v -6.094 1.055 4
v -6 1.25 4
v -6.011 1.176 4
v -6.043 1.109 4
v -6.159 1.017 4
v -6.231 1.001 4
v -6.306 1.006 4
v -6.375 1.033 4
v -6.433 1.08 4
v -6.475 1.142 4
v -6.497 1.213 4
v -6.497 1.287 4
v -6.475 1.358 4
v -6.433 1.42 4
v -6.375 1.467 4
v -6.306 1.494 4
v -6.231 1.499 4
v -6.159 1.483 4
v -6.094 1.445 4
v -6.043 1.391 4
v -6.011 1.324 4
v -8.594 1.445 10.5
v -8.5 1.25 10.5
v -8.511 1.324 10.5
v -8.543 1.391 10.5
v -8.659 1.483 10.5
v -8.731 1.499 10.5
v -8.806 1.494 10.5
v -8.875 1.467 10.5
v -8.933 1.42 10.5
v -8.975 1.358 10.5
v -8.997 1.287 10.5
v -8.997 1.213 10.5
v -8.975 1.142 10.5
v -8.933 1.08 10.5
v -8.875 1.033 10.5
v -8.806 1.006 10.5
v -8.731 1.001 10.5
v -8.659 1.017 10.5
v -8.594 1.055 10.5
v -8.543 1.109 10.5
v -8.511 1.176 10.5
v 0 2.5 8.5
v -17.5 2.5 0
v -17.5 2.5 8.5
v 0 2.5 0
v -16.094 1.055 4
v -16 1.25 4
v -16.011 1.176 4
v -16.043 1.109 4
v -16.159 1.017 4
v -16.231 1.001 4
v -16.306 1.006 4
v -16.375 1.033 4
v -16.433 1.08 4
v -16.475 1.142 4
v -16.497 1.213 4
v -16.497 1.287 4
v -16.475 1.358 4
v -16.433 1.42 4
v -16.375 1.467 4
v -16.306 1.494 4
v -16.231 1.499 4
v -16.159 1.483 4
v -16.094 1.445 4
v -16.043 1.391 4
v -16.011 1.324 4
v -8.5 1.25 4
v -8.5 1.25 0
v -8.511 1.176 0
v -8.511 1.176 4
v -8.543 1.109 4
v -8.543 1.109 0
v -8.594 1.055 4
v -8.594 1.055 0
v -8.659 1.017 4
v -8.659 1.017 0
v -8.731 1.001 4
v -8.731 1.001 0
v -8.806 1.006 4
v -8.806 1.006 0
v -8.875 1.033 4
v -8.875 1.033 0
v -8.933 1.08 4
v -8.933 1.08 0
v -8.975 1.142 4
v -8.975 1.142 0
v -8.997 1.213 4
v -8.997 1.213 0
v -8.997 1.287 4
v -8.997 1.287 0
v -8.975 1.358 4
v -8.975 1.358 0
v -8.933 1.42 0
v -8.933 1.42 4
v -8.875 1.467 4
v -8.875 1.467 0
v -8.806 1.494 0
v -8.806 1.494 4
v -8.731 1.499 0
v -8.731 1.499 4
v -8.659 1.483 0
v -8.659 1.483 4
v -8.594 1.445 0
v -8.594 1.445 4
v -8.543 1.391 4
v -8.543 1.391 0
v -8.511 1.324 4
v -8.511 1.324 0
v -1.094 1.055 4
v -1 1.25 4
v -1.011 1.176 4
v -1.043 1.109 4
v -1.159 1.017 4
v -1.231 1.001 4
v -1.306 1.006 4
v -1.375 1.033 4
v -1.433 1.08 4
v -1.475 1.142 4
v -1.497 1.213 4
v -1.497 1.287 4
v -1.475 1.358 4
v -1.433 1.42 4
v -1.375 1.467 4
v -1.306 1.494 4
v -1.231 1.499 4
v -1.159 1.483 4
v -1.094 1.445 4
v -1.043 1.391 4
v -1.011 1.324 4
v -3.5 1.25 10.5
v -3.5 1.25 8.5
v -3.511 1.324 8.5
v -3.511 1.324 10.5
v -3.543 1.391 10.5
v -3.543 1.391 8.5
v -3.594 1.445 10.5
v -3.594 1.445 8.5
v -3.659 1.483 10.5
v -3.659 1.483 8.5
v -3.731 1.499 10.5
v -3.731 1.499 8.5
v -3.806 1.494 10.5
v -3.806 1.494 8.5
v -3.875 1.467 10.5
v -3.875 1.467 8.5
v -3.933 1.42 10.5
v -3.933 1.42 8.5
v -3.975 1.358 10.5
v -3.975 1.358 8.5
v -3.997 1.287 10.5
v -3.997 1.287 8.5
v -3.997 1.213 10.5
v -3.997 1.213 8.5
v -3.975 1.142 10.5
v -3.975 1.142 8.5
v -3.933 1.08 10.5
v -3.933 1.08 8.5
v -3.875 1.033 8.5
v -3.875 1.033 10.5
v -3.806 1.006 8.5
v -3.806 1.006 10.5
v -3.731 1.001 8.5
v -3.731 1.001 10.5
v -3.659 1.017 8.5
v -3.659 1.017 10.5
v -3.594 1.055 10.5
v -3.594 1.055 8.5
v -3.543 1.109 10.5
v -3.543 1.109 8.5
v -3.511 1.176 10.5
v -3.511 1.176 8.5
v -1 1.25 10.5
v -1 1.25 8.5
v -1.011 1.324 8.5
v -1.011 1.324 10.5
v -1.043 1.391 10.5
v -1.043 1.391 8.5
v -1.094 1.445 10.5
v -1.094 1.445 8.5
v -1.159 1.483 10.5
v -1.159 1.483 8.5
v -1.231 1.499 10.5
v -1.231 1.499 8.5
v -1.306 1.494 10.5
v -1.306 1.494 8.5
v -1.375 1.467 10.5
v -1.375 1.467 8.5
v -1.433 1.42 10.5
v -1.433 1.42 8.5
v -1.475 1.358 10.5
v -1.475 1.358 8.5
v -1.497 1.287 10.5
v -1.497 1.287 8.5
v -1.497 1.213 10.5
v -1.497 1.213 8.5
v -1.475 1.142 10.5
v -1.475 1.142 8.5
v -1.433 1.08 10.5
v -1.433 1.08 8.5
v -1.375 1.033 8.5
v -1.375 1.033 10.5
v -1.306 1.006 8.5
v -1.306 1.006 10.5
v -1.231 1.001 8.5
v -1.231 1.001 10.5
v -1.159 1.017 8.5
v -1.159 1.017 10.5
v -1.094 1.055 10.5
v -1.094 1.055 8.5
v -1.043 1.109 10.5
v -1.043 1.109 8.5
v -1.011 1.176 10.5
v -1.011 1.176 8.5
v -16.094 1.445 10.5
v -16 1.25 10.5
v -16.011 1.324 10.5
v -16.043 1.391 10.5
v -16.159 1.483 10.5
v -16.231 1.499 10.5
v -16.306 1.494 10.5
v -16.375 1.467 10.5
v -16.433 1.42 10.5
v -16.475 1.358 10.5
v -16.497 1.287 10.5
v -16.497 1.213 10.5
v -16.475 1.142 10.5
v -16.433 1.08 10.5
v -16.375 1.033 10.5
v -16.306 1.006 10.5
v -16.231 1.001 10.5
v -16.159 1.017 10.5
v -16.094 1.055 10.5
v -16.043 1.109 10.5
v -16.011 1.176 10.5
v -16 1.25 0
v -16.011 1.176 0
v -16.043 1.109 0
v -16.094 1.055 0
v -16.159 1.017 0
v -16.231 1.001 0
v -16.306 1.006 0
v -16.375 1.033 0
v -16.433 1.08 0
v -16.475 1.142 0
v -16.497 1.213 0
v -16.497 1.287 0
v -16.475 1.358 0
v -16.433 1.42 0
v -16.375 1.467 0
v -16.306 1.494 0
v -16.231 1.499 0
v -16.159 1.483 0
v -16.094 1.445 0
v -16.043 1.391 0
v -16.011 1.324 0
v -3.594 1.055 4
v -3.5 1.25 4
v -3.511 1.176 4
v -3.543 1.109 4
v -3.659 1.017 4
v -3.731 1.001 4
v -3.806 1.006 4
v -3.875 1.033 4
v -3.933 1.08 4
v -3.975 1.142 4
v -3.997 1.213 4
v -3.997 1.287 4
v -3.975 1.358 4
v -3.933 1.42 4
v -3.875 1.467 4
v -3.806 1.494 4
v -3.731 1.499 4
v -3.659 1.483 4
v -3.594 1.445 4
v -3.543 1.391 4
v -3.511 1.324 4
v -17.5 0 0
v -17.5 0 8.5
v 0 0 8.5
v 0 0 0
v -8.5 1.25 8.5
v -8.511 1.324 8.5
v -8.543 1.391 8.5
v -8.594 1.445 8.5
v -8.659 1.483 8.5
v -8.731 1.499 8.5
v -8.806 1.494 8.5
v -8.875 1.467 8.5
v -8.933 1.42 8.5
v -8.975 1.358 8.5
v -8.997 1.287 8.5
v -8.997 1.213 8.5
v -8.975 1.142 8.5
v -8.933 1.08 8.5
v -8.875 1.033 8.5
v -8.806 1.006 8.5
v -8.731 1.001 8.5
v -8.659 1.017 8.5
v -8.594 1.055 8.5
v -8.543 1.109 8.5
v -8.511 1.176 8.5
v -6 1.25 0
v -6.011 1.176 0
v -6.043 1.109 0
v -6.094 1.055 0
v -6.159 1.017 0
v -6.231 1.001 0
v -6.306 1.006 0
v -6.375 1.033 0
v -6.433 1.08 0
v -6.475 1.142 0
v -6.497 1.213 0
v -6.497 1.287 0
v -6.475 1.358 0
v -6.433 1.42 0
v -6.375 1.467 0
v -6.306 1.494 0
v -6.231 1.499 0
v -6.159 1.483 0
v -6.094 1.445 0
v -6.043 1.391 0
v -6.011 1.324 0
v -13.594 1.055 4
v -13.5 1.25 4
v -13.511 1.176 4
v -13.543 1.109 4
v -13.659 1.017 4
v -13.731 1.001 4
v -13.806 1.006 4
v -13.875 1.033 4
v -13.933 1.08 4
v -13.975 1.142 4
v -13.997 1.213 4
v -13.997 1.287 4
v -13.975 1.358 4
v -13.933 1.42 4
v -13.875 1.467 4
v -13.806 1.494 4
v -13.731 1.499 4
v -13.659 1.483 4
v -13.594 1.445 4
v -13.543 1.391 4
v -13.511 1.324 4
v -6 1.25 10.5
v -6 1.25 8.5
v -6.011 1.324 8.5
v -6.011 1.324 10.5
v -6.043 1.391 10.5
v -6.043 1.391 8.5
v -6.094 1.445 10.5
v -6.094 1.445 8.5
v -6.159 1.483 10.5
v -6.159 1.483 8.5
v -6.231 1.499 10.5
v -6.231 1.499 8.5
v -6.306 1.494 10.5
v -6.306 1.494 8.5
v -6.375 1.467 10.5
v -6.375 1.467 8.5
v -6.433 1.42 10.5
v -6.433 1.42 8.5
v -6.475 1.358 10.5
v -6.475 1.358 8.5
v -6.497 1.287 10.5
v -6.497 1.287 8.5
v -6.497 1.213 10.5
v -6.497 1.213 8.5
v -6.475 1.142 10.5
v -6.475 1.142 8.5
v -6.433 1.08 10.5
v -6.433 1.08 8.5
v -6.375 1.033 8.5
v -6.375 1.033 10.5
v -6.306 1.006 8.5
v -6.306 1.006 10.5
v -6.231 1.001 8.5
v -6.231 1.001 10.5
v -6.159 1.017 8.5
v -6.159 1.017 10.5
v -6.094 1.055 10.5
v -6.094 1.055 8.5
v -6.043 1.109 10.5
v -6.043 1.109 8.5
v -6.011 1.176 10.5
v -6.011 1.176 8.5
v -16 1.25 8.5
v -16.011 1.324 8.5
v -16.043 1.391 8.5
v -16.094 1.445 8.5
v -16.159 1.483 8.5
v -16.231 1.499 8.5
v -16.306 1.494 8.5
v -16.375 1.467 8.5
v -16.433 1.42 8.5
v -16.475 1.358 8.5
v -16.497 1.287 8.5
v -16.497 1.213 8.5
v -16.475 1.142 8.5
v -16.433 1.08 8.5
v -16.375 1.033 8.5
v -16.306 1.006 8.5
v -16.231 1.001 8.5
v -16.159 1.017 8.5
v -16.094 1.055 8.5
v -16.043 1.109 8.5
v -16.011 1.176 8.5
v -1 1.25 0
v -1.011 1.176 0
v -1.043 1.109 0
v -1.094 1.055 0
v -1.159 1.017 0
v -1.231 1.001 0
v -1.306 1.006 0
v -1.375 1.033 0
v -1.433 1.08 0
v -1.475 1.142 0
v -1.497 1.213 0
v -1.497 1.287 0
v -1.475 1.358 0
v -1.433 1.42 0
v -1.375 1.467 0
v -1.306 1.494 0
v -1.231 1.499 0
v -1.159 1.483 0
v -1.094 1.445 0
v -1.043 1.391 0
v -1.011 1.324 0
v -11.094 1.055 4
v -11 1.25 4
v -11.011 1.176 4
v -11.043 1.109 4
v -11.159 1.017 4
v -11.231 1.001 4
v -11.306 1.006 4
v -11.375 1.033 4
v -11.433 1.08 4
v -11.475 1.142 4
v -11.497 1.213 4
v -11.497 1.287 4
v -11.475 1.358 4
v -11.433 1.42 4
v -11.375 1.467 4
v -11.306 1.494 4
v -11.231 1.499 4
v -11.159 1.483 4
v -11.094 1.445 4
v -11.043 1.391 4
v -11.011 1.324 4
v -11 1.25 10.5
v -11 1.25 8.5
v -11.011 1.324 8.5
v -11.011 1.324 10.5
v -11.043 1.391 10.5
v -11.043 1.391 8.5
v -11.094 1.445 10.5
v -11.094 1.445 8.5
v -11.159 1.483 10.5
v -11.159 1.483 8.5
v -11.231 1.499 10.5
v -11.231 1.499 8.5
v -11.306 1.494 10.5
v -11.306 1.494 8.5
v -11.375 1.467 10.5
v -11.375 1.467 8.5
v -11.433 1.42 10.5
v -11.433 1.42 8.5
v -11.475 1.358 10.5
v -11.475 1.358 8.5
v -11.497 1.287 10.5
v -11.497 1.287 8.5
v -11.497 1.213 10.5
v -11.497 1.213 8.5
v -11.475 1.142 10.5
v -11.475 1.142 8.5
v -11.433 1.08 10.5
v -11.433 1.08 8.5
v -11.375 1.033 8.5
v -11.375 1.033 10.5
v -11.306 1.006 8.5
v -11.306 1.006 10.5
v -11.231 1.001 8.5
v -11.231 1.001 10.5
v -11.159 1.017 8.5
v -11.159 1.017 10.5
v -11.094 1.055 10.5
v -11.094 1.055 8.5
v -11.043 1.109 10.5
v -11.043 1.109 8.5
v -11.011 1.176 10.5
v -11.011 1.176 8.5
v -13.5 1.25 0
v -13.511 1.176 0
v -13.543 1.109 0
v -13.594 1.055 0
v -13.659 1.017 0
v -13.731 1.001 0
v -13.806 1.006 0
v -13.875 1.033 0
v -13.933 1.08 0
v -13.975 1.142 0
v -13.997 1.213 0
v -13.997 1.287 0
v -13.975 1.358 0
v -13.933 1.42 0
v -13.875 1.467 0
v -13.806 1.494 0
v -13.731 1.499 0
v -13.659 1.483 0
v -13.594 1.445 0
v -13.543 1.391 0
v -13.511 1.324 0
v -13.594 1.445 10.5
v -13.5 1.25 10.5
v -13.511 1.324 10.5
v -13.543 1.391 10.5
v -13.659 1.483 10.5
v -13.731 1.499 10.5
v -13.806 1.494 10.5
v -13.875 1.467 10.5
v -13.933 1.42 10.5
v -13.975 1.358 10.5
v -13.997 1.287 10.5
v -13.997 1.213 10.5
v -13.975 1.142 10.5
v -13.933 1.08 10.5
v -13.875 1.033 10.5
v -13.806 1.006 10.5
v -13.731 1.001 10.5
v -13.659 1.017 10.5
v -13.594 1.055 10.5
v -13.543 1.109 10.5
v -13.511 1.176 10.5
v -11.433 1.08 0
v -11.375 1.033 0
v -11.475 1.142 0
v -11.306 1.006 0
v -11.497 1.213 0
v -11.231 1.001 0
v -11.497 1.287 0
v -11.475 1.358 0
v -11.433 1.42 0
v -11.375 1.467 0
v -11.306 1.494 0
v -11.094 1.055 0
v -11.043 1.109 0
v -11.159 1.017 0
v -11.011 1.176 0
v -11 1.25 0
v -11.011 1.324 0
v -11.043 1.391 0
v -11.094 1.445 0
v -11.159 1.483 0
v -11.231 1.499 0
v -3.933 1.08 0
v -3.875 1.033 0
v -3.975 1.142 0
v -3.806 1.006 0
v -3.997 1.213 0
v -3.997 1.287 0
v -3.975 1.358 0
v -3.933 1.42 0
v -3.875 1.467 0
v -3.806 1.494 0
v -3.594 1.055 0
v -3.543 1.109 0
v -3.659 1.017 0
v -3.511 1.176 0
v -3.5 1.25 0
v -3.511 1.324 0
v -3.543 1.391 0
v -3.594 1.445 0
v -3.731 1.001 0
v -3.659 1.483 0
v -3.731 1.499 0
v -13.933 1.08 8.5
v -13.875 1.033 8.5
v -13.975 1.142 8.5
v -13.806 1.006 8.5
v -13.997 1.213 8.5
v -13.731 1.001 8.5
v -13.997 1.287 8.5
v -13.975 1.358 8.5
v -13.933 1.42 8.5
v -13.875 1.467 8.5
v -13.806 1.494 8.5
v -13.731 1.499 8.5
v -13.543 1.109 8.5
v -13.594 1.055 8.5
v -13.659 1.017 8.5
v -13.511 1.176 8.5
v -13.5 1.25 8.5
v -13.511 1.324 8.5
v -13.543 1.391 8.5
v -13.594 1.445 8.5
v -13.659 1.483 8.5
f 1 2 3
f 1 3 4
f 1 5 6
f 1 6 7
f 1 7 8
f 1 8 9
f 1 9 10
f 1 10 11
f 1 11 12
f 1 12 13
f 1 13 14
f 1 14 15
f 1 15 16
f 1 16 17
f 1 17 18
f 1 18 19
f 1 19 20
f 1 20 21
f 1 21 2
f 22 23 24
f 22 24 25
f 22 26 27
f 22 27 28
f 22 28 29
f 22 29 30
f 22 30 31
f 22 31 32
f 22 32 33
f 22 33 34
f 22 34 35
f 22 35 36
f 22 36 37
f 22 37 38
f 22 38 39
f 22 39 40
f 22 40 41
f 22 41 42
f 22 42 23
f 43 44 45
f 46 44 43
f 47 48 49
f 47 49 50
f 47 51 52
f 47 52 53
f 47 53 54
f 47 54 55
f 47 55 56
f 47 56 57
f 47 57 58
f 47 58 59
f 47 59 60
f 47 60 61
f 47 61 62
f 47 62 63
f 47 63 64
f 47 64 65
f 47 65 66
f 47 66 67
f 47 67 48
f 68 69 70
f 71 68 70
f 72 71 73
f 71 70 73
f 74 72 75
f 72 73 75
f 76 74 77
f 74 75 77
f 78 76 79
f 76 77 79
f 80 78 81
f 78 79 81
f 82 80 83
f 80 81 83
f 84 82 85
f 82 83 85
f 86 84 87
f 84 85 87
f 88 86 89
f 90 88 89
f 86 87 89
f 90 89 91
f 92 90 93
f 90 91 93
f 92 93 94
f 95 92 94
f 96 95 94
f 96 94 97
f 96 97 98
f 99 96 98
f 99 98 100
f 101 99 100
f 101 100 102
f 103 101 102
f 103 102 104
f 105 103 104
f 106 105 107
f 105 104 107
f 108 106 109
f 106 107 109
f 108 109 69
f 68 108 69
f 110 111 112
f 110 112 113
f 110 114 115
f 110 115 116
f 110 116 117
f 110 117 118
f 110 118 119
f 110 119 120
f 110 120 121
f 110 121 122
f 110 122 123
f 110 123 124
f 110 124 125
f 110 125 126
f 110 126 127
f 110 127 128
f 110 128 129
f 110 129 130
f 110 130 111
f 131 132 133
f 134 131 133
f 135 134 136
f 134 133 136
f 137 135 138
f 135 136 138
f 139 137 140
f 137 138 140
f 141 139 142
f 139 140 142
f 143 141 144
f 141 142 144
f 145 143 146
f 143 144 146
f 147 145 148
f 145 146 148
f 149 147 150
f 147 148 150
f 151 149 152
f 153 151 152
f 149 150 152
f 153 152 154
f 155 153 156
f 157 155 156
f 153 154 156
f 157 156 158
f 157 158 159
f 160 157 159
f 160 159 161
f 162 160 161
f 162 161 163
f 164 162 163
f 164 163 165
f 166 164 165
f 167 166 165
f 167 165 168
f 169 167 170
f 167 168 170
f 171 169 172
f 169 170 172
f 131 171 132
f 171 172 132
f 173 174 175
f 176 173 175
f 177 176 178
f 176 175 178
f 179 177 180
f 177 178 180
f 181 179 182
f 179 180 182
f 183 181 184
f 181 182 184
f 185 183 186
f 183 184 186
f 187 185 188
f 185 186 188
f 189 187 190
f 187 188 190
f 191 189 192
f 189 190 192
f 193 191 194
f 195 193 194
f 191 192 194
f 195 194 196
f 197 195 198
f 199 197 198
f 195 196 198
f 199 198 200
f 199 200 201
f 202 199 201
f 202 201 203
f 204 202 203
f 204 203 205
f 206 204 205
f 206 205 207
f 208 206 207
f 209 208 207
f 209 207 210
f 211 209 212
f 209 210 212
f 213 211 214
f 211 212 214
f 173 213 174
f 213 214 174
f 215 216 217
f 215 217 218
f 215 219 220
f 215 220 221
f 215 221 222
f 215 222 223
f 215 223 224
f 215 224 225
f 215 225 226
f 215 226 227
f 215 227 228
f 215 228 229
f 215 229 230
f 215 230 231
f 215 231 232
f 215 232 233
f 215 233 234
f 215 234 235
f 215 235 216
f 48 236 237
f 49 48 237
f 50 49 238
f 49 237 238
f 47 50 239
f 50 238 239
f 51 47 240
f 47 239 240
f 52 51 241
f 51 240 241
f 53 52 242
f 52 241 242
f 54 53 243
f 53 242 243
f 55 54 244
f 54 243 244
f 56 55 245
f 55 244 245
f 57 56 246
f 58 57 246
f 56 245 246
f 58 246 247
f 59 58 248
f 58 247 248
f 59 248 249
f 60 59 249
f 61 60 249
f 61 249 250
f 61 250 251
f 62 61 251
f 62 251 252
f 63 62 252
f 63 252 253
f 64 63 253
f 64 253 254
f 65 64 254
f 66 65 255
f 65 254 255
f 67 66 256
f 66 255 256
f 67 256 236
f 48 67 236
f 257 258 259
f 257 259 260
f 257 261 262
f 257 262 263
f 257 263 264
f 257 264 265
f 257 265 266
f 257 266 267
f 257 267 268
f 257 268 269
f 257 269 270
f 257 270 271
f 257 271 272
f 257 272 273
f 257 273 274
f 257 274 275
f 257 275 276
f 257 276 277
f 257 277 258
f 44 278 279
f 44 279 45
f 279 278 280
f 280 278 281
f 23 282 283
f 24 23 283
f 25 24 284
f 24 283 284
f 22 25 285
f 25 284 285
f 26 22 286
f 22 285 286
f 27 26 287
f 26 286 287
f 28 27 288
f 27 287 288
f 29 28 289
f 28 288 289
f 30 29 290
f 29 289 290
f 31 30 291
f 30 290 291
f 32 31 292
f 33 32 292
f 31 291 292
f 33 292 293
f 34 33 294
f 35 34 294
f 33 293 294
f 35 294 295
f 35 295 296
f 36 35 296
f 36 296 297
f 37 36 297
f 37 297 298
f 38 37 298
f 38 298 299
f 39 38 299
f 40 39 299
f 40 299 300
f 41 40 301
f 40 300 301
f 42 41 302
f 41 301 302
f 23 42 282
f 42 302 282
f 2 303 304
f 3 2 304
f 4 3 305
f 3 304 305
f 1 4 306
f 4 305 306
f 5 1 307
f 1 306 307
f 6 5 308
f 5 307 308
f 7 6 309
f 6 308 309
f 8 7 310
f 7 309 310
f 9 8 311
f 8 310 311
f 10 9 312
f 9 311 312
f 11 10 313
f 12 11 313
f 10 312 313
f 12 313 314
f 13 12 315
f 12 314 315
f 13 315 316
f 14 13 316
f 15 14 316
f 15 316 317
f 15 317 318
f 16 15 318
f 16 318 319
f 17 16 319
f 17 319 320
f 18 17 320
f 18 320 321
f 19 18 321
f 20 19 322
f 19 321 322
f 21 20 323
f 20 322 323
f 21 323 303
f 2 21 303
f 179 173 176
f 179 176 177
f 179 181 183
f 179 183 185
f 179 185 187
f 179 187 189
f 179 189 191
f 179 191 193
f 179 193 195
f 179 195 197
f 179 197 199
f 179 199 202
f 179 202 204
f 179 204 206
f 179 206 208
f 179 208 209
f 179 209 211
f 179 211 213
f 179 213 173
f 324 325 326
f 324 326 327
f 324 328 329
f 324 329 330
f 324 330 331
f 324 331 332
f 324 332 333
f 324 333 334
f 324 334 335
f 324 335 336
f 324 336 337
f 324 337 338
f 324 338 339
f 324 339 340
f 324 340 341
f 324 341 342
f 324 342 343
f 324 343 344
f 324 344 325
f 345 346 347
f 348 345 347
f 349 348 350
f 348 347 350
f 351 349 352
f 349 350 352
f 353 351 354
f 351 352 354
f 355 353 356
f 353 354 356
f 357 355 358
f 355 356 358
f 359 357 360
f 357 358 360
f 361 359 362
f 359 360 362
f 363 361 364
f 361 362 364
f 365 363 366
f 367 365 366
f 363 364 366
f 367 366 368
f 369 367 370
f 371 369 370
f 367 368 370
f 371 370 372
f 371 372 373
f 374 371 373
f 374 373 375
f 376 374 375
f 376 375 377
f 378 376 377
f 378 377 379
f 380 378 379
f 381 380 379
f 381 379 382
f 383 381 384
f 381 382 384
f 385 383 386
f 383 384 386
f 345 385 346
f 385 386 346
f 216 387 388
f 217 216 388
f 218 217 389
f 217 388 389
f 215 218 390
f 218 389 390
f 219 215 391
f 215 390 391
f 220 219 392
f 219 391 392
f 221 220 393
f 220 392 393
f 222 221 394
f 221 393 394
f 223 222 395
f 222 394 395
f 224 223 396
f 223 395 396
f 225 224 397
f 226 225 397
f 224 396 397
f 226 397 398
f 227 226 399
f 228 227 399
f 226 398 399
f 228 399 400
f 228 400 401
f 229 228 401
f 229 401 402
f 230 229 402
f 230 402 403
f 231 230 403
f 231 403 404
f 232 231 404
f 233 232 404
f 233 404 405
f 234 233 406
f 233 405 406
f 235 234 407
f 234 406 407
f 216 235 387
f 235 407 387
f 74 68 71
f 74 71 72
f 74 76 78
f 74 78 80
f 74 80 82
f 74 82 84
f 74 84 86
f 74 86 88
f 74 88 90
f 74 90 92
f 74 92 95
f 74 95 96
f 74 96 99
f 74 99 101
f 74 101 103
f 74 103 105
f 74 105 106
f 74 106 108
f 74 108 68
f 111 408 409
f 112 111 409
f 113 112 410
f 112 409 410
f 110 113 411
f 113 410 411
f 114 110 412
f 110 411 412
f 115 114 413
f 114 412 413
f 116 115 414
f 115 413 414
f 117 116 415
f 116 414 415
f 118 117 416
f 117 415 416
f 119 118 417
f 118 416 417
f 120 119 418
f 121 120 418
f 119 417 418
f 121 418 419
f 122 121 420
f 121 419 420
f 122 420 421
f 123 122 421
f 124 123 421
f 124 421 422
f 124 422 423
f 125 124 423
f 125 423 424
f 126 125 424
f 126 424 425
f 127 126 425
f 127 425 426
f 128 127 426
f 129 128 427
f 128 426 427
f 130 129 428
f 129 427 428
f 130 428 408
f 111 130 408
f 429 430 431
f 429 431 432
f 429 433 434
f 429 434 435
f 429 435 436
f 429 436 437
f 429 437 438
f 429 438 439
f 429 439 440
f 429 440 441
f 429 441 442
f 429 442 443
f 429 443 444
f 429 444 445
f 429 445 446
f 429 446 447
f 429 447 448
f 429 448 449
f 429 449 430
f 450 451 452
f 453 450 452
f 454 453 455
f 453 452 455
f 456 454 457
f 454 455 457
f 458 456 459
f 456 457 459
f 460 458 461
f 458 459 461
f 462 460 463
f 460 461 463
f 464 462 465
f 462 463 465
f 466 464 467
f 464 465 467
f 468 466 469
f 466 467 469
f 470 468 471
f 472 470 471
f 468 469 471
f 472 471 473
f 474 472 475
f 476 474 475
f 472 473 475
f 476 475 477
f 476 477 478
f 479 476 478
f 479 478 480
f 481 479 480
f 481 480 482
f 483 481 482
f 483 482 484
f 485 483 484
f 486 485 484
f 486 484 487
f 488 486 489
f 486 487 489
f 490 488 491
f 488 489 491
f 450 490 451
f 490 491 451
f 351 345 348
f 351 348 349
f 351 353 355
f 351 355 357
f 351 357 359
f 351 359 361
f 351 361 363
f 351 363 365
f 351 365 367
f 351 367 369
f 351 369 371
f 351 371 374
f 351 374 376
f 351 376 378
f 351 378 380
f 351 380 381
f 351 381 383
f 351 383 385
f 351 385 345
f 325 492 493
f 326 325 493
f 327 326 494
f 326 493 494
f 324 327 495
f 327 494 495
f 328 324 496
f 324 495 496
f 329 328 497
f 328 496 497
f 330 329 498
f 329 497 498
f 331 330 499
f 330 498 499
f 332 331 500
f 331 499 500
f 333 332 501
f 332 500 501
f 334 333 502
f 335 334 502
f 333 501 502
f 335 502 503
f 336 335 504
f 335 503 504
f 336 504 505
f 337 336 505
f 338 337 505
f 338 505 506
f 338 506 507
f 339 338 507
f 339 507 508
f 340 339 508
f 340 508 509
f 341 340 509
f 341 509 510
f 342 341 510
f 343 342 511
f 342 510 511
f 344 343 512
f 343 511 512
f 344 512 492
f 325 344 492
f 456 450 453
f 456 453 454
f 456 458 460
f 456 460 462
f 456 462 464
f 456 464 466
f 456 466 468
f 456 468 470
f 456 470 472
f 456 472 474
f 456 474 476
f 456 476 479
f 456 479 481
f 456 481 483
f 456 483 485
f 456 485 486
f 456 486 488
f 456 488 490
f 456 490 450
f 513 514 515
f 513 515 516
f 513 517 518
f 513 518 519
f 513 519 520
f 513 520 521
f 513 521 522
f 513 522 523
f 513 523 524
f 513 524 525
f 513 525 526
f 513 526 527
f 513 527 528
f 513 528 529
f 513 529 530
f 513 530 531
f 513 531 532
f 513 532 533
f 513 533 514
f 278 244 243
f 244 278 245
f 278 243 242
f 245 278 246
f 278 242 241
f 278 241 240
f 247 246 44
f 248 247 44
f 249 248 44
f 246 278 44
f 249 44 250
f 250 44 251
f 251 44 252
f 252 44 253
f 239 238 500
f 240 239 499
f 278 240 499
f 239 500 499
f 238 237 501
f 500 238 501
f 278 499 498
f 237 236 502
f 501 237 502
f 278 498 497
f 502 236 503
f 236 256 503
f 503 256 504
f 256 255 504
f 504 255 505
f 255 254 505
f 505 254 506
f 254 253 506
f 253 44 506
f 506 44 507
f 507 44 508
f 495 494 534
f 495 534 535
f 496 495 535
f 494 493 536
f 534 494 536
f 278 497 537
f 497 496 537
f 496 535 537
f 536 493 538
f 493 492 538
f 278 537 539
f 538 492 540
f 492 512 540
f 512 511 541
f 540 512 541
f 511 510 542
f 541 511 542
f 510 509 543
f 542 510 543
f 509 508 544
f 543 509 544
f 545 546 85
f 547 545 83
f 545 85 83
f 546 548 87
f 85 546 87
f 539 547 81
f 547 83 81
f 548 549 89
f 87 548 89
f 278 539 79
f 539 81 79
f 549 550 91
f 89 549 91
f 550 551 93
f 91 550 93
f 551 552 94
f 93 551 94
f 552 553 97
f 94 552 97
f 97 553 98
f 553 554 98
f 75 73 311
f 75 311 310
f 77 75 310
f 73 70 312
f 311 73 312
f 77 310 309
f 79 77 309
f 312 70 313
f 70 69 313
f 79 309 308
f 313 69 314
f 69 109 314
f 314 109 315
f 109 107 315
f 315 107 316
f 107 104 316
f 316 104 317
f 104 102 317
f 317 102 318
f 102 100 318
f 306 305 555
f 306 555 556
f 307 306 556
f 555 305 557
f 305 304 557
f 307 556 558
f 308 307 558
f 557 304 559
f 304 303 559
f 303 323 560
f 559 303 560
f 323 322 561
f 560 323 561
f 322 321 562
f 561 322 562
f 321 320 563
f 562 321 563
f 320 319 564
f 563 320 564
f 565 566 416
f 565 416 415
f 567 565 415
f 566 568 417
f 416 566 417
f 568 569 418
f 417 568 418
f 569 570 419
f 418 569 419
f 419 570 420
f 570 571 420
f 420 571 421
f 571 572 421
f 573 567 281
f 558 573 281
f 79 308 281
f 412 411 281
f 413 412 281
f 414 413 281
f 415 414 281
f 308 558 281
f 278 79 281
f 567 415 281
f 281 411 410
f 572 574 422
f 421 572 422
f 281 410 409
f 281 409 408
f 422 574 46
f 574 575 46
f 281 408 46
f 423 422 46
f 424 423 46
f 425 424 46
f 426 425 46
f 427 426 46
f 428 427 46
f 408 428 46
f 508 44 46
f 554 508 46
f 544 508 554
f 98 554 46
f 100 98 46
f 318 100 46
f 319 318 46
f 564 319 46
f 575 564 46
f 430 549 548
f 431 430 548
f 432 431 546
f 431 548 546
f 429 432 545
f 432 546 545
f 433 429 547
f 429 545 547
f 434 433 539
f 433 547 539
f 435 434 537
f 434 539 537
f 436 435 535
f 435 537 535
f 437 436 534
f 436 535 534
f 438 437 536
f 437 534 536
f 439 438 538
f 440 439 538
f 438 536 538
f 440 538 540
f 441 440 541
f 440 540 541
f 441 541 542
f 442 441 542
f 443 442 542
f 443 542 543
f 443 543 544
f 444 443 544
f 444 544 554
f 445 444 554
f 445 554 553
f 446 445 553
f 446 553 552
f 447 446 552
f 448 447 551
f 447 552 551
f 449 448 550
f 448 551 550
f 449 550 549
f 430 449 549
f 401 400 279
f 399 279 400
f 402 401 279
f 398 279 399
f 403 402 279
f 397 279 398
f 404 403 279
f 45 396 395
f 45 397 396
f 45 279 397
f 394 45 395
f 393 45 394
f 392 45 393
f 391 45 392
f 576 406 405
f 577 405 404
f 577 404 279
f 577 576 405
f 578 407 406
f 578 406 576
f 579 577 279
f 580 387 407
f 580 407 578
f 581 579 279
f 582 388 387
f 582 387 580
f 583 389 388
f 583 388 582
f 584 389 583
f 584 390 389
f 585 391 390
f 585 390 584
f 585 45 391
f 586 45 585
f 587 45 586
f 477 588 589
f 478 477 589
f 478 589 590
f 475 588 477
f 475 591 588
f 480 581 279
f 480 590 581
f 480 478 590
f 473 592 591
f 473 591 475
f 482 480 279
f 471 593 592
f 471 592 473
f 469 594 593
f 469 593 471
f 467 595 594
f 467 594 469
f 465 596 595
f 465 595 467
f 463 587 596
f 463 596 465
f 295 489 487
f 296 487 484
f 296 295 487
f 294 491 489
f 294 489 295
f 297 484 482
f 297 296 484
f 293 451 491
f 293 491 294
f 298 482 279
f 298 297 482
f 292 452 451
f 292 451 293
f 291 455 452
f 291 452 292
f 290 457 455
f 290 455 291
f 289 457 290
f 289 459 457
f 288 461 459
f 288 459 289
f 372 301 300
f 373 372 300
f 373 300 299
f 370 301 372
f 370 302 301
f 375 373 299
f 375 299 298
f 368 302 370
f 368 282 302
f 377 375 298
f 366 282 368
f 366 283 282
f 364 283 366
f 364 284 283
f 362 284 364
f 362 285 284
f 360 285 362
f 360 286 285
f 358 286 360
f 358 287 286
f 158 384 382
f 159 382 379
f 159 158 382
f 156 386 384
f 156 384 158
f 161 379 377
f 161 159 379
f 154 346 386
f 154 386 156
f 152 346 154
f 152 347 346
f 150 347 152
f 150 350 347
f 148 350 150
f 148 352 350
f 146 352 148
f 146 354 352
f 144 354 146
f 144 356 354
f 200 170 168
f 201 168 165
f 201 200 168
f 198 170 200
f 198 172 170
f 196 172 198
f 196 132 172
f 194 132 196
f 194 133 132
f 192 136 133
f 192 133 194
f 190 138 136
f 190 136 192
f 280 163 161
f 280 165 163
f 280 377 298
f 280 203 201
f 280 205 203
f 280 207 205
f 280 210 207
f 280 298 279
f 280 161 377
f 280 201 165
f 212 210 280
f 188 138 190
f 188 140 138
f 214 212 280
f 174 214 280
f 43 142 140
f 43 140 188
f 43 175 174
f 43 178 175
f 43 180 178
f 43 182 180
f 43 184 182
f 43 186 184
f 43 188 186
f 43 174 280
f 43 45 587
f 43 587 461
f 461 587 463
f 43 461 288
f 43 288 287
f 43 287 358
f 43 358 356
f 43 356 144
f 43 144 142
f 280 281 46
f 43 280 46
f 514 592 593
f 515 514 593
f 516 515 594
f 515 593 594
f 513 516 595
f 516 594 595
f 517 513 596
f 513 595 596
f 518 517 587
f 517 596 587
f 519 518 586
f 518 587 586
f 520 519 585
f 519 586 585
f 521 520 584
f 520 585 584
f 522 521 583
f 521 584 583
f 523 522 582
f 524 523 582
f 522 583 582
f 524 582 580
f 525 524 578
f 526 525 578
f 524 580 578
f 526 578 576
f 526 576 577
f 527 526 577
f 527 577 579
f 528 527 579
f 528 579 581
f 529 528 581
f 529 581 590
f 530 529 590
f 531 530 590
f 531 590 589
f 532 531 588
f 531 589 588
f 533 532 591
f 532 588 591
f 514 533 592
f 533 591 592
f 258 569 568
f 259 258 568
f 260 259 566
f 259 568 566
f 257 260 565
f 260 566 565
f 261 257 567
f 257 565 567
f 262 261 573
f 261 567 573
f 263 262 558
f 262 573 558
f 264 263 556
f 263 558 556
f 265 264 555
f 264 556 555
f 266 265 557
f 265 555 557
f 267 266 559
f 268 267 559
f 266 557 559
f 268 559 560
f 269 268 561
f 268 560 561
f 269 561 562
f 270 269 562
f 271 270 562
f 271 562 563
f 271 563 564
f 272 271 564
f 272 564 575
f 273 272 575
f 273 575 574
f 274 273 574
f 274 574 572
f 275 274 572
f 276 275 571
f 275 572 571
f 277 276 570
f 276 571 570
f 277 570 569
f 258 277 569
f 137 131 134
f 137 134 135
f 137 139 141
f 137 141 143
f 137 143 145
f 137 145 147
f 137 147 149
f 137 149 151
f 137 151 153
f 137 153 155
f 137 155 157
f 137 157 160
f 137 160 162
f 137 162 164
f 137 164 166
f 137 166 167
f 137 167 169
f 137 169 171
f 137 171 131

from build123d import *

# Parameters (mm, degrees)
ESQUISSE1_W                = 2.5
ESQUISSE1_H                = 2.5
BOSS_EXTRU_1_DEPTH         = 8.5
ESQUISSE2_R                = 0.25
BOSS_EXTRU_2_DEPTH         = 2
ESQUISSE3_R                = 0.25
ENL_V_MAT_EXTRU_2_DEPTH    = 4
R_P_TITION_LIN_AIRE1_COUNT = 7
R_P_TITION_LIN_AIRE1_PITCH = 2.5


with BuildPart() as part:
    # Esquisse1 → Boss.-Extru.1 (new body)
    with BuildSketch(Plane.XY):
        with Locations((-1.25, 1.25)):
            Rectangle(ESQUISSE1_W, ESQUISSE1_H)
    boss_extru_1 = extrude(amount=BOSS_EXTRU_1_DEPTH)

    # Esquisse2 → Boss.-Extru.2 (add)
    with BuildSketch(Plane.XY.offset(8.5)):
        with Locations((-1.25, 1.25)):
            Circle(ESQUISSE2_R)
    boss_extru_2 = extrude(amount=BOSS_EXTRU_2_DEPTH)

    # Esquisse3 → Enlèv. mat.-Extru.2 (cut)
    with BuildSketch(Plane(origin=(0, 0, 0), x_dir=(-1, 0, 0), z_dir=(0, 0, -1))):
        with Locations(Location((1.25, 1.25, 0), (0, 0, 180))):
            Circle(ESQUISSE3_R)
    enl_v_mat_extru_2 = extrude(amount=-ENL_V_MAT_EXTRU_2_DEPTH, mode=Mode.SUBTRACT)

    # Répétition linéaire1: Boss.-Extru.1, Boss.-Extru.2, Enlèv. mat.-Extru.2 ×7
    with Locations(*[(-i * R_P_TITION_LIN_AIRE1_PITCH, 0, 0) for i in range(1, R_P_TITION_LIN_AIRE1_COUNT)]):
        add(boss_extru_1)
        add(boss_extru_2)
        add(enl_v_mat_extru_2, mode=Mode.SUBTRACT)


solid = part.part
